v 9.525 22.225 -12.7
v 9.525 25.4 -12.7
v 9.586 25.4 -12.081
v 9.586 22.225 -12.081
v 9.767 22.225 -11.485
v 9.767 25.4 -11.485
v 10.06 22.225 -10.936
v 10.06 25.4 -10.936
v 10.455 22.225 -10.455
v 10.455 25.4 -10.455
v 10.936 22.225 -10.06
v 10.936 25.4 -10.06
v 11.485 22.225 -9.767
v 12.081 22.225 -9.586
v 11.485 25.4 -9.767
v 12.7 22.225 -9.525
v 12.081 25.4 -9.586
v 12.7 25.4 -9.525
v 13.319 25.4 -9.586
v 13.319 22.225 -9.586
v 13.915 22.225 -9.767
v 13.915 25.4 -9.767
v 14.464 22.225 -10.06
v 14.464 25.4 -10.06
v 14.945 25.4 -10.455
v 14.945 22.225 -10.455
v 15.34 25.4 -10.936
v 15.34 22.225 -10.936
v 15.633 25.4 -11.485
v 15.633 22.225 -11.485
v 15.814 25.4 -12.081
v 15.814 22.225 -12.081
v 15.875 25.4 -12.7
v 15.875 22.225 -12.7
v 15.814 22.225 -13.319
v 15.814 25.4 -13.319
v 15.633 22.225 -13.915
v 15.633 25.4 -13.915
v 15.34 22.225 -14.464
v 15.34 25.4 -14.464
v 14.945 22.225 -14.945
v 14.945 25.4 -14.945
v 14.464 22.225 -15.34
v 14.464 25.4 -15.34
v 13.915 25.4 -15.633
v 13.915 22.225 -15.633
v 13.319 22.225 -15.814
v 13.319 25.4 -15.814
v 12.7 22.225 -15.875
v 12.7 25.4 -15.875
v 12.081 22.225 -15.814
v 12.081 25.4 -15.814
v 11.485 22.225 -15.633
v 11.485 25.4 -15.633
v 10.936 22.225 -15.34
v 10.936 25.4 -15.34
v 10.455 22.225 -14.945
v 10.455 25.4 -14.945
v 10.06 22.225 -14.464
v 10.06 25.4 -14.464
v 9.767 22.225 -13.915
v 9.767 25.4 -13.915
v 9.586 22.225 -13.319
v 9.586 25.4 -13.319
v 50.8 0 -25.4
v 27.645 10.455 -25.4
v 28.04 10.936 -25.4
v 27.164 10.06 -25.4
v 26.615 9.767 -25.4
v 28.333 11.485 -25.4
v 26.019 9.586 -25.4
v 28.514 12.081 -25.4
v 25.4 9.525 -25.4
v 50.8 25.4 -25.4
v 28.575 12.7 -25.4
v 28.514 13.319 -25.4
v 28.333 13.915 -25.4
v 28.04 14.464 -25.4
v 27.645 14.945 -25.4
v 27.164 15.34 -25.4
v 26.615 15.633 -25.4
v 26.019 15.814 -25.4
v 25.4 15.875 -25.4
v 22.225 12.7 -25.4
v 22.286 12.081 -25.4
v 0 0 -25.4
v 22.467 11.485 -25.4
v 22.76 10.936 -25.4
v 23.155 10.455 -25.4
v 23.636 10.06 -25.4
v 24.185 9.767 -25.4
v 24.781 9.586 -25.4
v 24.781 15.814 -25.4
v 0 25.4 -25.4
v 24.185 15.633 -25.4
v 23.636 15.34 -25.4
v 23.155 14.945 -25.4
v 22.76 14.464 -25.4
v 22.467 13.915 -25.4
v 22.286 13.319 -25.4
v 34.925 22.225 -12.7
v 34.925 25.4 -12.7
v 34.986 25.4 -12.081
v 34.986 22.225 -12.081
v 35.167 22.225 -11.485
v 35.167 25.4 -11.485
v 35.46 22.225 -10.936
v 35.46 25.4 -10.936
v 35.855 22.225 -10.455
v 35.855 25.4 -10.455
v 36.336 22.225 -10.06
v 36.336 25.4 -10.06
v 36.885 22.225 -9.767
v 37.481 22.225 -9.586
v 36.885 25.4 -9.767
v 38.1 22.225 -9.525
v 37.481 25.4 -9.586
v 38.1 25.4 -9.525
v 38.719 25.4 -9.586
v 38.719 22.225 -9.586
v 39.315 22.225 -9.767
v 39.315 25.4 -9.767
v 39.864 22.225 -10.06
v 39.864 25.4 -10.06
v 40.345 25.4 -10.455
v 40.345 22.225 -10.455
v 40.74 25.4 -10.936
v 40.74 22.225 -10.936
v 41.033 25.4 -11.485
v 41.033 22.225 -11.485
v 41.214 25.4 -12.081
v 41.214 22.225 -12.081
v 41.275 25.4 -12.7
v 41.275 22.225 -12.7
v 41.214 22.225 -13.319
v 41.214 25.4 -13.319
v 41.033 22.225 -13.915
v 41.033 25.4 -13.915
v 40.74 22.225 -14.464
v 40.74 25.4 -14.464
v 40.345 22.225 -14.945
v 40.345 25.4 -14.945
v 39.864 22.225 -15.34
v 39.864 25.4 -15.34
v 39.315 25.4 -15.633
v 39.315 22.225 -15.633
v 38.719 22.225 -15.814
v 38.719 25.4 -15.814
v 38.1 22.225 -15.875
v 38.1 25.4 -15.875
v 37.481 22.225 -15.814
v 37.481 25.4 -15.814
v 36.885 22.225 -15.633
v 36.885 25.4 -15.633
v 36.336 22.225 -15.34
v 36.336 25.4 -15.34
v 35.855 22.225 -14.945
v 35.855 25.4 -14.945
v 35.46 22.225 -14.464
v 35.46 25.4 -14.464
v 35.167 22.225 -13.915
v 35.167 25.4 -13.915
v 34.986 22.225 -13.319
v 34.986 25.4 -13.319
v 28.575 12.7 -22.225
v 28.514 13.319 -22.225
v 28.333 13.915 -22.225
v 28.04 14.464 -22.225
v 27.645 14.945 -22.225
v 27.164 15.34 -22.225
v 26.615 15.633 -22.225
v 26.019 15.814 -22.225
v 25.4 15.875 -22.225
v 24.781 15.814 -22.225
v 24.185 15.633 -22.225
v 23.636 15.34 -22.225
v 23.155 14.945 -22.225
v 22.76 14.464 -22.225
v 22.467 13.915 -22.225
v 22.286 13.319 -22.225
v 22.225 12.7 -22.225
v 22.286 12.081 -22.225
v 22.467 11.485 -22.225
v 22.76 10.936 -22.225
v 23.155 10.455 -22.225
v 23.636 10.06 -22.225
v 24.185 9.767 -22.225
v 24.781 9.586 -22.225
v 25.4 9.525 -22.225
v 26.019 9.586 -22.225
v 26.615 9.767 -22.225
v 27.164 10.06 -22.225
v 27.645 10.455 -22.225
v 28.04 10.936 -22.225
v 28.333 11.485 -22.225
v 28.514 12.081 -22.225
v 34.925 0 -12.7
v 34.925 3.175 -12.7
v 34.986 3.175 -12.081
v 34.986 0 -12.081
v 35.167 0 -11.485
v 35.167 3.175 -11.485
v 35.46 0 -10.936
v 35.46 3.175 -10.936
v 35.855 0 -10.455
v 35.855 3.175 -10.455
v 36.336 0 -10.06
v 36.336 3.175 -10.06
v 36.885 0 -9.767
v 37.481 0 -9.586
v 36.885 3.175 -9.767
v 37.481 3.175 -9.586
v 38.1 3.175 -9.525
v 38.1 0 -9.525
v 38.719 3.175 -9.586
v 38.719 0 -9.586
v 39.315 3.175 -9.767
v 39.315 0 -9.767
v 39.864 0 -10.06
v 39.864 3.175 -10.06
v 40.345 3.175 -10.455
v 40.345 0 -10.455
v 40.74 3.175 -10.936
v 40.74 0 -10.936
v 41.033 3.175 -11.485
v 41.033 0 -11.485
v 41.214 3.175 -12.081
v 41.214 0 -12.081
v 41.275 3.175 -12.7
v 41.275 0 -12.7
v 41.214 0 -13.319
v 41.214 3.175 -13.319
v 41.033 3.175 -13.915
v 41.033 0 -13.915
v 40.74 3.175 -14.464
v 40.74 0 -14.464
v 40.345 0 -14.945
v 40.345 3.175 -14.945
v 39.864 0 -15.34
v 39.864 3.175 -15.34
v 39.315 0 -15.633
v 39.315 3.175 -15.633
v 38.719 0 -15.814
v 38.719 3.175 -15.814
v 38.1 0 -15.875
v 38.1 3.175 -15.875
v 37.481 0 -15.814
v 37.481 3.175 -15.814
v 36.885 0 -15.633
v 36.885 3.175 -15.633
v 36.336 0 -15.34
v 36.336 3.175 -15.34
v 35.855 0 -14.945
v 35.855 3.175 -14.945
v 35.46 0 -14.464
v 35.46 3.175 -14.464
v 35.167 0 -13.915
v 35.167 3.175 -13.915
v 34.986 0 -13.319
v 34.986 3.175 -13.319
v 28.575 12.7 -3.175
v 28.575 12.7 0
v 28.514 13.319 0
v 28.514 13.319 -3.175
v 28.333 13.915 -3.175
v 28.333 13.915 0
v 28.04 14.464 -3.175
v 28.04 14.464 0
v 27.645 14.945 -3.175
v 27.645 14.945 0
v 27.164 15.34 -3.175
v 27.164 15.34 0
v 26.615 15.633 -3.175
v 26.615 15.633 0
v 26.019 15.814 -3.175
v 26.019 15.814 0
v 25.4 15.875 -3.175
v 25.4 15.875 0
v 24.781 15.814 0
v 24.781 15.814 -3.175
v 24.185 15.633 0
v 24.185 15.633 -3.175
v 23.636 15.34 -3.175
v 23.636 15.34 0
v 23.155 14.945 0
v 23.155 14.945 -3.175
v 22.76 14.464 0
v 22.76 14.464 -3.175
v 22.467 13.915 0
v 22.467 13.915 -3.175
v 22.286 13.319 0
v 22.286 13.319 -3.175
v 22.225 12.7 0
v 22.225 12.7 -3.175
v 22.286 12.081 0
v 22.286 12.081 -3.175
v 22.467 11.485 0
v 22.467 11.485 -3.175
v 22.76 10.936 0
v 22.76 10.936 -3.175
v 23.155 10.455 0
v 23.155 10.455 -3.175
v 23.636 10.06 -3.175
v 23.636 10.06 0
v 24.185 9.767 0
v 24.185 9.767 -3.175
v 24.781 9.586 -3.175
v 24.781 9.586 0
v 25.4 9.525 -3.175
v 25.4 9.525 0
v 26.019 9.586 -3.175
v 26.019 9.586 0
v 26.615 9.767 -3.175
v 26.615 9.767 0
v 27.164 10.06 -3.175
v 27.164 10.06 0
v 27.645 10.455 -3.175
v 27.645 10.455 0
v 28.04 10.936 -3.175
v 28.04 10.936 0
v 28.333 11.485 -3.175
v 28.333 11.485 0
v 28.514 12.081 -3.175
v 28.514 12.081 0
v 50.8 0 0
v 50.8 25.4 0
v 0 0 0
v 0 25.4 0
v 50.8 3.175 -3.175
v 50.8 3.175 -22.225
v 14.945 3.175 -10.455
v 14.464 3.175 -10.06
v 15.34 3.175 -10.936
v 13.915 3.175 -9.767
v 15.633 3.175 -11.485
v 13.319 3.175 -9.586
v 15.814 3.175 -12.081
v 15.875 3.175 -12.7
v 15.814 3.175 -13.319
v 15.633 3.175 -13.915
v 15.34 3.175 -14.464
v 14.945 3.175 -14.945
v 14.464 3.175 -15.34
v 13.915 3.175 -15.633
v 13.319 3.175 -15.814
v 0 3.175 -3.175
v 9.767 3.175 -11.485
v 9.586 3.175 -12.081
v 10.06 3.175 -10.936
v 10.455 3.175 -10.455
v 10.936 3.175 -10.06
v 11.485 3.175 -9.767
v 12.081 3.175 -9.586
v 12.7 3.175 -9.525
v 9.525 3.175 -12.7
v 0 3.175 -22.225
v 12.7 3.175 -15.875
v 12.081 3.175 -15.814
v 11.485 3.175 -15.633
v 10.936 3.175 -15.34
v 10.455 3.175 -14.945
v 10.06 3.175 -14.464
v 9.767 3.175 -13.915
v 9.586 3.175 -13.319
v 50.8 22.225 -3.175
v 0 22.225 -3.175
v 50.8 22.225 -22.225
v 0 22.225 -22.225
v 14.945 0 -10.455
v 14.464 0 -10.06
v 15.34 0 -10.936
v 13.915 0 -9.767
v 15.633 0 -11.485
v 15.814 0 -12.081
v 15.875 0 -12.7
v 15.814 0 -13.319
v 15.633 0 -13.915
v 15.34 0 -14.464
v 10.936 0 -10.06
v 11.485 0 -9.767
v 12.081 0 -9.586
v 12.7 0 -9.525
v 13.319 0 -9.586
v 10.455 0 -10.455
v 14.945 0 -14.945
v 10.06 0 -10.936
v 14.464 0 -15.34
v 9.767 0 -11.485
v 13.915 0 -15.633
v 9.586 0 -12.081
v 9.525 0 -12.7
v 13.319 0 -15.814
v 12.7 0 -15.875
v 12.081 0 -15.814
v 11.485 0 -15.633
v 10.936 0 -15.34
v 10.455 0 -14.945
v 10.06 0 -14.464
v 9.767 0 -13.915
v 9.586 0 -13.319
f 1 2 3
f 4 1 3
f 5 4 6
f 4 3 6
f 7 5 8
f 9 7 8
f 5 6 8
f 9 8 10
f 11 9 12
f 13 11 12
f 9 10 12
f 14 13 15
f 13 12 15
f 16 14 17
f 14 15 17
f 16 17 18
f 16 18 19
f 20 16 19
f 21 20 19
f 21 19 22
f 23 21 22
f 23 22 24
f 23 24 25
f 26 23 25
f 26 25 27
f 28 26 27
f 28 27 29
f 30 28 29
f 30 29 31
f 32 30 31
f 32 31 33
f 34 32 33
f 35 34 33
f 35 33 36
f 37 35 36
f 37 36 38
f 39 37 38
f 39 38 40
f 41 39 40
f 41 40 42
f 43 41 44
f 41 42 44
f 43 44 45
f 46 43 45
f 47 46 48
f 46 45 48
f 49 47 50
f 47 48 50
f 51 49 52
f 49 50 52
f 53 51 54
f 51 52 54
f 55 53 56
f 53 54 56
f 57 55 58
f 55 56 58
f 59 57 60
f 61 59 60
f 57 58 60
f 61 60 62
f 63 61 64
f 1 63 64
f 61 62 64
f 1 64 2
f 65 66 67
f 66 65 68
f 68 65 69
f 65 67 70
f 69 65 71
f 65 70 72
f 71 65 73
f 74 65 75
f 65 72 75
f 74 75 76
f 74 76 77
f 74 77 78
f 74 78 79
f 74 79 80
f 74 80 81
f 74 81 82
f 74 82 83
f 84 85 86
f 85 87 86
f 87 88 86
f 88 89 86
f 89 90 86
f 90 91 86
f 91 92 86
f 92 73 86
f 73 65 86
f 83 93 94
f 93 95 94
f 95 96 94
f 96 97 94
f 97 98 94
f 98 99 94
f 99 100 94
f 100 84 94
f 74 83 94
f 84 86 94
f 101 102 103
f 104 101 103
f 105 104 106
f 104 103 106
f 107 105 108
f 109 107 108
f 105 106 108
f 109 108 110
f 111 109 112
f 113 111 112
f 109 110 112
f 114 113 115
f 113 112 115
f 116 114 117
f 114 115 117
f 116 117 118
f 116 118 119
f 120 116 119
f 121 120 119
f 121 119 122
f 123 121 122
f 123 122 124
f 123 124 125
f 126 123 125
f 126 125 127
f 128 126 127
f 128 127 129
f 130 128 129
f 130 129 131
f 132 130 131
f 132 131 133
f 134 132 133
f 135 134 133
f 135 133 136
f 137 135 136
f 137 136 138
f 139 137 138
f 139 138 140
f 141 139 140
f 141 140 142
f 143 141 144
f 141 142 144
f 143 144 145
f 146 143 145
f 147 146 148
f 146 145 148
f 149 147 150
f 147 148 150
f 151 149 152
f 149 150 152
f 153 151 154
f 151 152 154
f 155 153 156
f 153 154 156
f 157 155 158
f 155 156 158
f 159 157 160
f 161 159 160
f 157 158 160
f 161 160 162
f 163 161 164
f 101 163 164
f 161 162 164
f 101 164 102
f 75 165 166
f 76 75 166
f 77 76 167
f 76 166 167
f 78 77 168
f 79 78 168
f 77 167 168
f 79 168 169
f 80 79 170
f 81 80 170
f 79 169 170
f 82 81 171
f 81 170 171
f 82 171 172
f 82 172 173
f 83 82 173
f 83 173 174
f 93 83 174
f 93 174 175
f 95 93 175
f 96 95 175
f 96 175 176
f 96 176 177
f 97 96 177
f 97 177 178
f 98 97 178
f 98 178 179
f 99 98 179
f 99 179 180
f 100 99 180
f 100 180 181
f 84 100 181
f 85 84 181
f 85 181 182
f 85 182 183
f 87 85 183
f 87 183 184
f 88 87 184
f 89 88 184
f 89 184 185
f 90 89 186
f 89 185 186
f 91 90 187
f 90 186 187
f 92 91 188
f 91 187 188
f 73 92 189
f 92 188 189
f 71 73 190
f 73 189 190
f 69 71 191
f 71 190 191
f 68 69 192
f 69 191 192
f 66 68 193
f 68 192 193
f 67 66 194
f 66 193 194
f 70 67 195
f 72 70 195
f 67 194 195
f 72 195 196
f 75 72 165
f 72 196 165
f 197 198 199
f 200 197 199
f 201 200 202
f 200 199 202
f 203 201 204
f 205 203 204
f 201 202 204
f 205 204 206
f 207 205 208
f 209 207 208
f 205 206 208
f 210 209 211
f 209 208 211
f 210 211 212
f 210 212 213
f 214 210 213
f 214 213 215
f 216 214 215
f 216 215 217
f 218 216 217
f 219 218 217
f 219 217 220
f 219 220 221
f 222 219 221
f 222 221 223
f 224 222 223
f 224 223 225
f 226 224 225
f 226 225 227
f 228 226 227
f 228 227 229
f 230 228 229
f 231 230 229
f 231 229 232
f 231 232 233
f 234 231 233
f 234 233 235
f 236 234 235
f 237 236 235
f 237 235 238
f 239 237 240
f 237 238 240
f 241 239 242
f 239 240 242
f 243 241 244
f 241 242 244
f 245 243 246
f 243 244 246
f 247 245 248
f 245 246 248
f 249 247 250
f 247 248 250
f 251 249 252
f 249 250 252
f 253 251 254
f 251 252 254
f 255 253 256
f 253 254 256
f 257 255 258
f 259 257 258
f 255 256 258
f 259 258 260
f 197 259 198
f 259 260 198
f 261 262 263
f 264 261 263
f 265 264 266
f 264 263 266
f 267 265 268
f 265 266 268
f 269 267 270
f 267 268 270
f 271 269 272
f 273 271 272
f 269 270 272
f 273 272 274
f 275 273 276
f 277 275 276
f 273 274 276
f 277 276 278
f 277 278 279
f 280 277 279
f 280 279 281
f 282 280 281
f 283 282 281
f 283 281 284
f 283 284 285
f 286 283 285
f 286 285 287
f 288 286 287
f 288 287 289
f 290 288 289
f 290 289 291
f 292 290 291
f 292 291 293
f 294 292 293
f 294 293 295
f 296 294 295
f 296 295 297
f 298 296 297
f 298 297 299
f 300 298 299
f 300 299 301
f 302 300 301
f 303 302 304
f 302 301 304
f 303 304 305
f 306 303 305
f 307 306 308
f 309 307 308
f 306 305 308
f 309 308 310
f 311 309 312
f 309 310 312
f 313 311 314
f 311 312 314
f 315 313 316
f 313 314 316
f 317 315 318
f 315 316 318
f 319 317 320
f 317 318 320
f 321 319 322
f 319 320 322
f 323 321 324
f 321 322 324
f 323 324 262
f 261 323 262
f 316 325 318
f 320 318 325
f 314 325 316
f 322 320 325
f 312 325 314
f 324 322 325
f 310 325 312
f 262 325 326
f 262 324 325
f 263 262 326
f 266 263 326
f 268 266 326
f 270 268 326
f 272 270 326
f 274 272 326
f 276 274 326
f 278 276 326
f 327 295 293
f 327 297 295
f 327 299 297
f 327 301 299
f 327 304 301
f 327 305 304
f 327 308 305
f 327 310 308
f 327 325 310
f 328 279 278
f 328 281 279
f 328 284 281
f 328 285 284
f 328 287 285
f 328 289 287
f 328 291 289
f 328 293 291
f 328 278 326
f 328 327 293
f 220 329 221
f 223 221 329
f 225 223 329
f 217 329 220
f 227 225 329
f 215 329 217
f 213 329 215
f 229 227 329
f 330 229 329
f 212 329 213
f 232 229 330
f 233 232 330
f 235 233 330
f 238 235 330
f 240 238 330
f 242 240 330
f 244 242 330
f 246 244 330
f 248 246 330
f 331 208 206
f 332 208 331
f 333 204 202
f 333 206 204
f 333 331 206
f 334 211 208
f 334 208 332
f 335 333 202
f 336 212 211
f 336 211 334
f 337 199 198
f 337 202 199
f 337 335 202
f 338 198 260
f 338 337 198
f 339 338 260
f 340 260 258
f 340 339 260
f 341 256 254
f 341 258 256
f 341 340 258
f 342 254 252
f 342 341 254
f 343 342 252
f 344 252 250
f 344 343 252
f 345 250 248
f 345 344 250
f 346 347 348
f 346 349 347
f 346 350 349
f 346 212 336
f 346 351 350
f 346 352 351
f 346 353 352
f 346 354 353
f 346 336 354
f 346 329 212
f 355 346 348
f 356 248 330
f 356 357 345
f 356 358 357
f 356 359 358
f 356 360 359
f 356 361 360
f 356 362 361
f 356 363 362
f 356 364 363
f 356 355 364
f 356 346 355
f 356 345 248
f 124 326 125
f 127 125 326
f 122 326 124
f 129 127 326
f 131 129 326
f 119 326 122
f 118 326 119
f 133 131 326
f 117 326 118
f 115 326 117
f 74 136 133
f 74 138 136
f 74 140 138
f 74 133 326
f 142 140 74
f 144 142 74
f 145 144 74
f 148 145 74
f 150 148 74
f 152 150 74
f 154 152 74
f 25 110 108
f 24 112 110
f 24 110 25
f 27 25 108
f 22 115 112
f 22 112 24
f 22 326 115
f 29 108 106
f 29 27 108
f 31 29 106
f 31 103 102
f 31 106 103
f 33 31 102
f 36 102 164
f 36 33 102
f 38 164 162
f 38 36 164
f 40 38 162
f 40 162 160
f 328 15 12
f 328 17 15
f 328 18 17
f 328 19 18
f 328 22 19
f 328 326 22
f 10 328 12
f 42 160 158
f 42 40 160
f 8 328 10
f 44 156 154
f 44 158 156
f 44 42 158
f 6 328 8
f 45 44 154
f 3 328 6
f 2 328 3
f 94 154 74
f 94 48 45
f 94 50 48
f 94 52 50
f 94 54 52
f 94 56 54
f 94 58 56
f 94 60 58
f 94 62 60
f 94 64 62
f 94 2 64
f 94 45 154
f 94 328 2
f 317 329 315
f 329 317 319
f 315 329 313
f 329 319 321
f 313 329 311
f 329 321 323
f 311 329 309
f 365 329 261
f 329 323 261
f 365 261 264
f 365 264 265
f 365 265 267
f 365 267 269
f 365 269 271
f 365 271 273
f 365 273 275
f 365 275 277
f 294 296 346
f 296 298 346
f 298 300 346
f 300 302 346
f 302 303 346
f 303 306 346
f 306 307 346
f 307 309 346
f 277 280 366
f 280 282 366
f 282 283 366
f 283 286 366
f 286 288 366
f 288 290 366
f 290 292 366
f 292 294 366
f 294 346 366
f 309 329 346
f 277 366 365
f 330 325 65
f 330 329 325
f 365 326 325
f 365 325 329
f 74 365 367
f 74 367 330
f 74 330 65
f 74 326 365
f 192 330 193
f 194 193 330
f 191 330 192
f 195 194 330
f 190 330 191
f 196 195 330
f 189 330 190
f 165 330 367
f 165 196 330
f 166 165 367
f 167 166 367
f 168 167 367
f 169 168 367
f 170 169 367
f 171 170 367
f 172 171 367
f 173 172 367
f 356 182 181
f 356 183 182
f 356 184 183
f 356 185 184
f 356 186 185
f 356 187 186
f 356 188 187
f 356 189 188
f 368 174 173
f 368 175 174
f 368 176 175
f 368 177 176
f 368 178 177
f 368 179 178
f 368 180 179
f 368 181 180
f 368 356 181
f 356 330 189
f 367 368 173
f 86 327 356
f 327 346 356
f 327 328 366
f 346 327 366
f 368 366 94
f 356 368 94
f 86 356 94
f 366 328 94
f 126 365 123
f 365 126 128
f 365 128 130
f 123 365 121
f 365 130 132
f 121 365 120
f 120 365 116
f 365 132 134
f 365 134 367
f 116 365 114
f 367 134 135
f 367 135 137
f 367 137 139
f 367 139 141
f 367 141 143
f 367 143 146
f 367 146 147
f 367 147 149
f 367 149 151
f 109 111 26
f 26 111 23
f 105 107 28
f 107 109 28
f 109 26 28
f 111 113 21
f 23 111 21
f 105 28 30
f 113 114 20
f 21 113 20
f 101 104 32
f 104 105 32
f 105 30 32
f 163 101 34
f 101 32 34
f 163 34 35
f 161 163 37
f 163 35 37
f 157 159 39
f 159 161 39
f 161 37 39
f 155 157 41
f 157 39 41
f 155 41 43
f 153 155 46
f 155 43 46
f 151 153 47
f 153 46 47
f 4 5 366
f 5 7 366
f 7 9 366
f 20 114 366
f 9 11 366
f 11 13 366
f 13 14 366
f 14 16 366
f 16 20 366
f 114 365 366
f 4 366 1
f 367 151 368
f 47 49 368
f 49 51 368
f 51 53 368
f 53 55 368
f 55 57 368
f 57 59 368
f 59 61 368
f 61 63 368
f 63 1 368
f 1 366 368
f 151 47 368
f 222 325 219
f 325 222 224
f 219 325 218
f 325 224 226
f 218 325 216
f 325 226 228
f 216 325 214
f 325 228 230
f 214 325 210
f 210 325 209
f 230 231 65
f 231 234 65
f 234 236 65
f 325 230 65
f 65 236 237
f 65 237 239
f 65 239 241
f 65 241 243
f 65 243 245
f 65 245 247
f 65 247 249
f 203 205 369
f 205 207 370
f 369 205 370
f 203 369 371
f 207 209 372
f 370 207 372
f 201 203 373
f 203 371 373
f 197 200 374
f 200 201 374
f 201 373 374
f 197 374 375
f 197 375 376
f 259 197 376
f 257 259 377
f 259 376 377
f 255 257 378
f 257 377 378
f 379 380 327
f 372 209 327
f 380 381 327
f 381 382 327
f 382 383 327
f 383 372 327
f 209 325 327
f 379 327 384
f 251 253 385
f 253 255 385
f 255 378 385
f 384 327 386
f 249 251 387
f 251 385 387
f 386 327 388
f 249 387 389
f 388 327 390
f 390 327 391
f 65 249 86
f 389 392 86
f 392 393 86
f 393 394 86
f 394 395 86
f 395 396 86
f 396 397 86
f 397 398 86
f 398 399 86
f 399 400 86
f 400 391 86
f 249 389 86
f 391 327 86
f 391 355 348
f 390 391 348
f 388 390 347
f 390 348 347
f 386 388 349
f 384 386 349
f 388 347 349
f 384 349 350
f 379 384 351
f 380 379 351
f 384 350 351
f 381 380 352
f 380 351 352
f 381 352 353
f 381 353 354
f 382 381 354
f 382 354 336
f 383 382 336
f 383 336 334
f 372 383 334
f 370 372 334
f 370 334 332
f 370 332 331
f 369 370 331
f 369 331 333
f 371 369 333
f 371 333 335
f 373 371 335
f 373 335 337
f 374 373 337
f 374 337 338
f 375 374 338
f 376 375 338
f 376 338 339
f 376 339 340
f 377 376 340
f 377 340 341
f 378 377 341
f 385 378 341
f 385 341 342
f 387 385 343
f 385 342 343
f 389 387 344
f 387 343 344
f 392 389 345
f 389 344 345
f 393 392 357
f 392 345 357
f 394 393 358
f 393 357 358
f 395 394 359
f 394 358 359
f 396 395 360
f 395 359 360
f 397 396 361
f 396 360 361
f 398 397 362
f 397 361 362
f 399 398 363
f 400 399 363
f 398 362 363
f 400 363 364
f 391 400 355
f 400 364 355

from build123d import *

# Parameters (mm, degrees)
SKETCH1_W          = 25.4
SKETCH1_H          = 25.4
SKETCH1_W_2        = 19.05
SKETCH1_H_2        = 19.05
EXTRUDE1_DEPTH     = 50.8
SKETCH2_R          = 3.175
CUT_EXTRUDE1_DEPTH = 26.4
SKETCH3_R          = 3.175
CUT_EXTRUDE2_DEPTH = 26.4


with BuildPart() as part:
    # Sketch1 → Extrude1 (new body)
    with BuildSketch(Plane(origin=(0, 0, 0), x_dir=(0, 0, -1), z_dir=(1, 0, 0))):
        with Locations((12.7, 12.7)):
            Rectangle(SKETCH1_W, SKETCH1_H)
        with Locations((12.7, 12.7)):
            Rectangle(SKETCH1_W_2, SKETCH1_H_2, mode=Mode.SUBTRACT)
    extrude(amount=EXTRUDE1_DEPTH)

    # Sketch2 → Cut-Extrude1 (cut, through all)
    with BuildSketch(Plane.XY):
        with Locations((25.4, 12.7)):
            Circle(SKETCH2_R)
    extrude(amount=-CUT_EXTRUDE1_DEPTH, mode=Mode.SUBTRACT)

    # Sketch3 → Cut-Extrude2 (cut, through all)
    with BuildSketch(Plane(origin=(0, 25.4, 0), x_dir=(-1, 0, 0), z_dir=(0, 1, 0))):
        with Locations((-38.1, -12.7)):
            Circle(SKETCH3_R)
        with Locations((-12.7, -12.7)):
            Circle(SKETCH3_R)
    extrude(amount=-CUT_EXTRUDE2_DEPTH, mode=Mode.SUBTRACT)


solid = part.part
